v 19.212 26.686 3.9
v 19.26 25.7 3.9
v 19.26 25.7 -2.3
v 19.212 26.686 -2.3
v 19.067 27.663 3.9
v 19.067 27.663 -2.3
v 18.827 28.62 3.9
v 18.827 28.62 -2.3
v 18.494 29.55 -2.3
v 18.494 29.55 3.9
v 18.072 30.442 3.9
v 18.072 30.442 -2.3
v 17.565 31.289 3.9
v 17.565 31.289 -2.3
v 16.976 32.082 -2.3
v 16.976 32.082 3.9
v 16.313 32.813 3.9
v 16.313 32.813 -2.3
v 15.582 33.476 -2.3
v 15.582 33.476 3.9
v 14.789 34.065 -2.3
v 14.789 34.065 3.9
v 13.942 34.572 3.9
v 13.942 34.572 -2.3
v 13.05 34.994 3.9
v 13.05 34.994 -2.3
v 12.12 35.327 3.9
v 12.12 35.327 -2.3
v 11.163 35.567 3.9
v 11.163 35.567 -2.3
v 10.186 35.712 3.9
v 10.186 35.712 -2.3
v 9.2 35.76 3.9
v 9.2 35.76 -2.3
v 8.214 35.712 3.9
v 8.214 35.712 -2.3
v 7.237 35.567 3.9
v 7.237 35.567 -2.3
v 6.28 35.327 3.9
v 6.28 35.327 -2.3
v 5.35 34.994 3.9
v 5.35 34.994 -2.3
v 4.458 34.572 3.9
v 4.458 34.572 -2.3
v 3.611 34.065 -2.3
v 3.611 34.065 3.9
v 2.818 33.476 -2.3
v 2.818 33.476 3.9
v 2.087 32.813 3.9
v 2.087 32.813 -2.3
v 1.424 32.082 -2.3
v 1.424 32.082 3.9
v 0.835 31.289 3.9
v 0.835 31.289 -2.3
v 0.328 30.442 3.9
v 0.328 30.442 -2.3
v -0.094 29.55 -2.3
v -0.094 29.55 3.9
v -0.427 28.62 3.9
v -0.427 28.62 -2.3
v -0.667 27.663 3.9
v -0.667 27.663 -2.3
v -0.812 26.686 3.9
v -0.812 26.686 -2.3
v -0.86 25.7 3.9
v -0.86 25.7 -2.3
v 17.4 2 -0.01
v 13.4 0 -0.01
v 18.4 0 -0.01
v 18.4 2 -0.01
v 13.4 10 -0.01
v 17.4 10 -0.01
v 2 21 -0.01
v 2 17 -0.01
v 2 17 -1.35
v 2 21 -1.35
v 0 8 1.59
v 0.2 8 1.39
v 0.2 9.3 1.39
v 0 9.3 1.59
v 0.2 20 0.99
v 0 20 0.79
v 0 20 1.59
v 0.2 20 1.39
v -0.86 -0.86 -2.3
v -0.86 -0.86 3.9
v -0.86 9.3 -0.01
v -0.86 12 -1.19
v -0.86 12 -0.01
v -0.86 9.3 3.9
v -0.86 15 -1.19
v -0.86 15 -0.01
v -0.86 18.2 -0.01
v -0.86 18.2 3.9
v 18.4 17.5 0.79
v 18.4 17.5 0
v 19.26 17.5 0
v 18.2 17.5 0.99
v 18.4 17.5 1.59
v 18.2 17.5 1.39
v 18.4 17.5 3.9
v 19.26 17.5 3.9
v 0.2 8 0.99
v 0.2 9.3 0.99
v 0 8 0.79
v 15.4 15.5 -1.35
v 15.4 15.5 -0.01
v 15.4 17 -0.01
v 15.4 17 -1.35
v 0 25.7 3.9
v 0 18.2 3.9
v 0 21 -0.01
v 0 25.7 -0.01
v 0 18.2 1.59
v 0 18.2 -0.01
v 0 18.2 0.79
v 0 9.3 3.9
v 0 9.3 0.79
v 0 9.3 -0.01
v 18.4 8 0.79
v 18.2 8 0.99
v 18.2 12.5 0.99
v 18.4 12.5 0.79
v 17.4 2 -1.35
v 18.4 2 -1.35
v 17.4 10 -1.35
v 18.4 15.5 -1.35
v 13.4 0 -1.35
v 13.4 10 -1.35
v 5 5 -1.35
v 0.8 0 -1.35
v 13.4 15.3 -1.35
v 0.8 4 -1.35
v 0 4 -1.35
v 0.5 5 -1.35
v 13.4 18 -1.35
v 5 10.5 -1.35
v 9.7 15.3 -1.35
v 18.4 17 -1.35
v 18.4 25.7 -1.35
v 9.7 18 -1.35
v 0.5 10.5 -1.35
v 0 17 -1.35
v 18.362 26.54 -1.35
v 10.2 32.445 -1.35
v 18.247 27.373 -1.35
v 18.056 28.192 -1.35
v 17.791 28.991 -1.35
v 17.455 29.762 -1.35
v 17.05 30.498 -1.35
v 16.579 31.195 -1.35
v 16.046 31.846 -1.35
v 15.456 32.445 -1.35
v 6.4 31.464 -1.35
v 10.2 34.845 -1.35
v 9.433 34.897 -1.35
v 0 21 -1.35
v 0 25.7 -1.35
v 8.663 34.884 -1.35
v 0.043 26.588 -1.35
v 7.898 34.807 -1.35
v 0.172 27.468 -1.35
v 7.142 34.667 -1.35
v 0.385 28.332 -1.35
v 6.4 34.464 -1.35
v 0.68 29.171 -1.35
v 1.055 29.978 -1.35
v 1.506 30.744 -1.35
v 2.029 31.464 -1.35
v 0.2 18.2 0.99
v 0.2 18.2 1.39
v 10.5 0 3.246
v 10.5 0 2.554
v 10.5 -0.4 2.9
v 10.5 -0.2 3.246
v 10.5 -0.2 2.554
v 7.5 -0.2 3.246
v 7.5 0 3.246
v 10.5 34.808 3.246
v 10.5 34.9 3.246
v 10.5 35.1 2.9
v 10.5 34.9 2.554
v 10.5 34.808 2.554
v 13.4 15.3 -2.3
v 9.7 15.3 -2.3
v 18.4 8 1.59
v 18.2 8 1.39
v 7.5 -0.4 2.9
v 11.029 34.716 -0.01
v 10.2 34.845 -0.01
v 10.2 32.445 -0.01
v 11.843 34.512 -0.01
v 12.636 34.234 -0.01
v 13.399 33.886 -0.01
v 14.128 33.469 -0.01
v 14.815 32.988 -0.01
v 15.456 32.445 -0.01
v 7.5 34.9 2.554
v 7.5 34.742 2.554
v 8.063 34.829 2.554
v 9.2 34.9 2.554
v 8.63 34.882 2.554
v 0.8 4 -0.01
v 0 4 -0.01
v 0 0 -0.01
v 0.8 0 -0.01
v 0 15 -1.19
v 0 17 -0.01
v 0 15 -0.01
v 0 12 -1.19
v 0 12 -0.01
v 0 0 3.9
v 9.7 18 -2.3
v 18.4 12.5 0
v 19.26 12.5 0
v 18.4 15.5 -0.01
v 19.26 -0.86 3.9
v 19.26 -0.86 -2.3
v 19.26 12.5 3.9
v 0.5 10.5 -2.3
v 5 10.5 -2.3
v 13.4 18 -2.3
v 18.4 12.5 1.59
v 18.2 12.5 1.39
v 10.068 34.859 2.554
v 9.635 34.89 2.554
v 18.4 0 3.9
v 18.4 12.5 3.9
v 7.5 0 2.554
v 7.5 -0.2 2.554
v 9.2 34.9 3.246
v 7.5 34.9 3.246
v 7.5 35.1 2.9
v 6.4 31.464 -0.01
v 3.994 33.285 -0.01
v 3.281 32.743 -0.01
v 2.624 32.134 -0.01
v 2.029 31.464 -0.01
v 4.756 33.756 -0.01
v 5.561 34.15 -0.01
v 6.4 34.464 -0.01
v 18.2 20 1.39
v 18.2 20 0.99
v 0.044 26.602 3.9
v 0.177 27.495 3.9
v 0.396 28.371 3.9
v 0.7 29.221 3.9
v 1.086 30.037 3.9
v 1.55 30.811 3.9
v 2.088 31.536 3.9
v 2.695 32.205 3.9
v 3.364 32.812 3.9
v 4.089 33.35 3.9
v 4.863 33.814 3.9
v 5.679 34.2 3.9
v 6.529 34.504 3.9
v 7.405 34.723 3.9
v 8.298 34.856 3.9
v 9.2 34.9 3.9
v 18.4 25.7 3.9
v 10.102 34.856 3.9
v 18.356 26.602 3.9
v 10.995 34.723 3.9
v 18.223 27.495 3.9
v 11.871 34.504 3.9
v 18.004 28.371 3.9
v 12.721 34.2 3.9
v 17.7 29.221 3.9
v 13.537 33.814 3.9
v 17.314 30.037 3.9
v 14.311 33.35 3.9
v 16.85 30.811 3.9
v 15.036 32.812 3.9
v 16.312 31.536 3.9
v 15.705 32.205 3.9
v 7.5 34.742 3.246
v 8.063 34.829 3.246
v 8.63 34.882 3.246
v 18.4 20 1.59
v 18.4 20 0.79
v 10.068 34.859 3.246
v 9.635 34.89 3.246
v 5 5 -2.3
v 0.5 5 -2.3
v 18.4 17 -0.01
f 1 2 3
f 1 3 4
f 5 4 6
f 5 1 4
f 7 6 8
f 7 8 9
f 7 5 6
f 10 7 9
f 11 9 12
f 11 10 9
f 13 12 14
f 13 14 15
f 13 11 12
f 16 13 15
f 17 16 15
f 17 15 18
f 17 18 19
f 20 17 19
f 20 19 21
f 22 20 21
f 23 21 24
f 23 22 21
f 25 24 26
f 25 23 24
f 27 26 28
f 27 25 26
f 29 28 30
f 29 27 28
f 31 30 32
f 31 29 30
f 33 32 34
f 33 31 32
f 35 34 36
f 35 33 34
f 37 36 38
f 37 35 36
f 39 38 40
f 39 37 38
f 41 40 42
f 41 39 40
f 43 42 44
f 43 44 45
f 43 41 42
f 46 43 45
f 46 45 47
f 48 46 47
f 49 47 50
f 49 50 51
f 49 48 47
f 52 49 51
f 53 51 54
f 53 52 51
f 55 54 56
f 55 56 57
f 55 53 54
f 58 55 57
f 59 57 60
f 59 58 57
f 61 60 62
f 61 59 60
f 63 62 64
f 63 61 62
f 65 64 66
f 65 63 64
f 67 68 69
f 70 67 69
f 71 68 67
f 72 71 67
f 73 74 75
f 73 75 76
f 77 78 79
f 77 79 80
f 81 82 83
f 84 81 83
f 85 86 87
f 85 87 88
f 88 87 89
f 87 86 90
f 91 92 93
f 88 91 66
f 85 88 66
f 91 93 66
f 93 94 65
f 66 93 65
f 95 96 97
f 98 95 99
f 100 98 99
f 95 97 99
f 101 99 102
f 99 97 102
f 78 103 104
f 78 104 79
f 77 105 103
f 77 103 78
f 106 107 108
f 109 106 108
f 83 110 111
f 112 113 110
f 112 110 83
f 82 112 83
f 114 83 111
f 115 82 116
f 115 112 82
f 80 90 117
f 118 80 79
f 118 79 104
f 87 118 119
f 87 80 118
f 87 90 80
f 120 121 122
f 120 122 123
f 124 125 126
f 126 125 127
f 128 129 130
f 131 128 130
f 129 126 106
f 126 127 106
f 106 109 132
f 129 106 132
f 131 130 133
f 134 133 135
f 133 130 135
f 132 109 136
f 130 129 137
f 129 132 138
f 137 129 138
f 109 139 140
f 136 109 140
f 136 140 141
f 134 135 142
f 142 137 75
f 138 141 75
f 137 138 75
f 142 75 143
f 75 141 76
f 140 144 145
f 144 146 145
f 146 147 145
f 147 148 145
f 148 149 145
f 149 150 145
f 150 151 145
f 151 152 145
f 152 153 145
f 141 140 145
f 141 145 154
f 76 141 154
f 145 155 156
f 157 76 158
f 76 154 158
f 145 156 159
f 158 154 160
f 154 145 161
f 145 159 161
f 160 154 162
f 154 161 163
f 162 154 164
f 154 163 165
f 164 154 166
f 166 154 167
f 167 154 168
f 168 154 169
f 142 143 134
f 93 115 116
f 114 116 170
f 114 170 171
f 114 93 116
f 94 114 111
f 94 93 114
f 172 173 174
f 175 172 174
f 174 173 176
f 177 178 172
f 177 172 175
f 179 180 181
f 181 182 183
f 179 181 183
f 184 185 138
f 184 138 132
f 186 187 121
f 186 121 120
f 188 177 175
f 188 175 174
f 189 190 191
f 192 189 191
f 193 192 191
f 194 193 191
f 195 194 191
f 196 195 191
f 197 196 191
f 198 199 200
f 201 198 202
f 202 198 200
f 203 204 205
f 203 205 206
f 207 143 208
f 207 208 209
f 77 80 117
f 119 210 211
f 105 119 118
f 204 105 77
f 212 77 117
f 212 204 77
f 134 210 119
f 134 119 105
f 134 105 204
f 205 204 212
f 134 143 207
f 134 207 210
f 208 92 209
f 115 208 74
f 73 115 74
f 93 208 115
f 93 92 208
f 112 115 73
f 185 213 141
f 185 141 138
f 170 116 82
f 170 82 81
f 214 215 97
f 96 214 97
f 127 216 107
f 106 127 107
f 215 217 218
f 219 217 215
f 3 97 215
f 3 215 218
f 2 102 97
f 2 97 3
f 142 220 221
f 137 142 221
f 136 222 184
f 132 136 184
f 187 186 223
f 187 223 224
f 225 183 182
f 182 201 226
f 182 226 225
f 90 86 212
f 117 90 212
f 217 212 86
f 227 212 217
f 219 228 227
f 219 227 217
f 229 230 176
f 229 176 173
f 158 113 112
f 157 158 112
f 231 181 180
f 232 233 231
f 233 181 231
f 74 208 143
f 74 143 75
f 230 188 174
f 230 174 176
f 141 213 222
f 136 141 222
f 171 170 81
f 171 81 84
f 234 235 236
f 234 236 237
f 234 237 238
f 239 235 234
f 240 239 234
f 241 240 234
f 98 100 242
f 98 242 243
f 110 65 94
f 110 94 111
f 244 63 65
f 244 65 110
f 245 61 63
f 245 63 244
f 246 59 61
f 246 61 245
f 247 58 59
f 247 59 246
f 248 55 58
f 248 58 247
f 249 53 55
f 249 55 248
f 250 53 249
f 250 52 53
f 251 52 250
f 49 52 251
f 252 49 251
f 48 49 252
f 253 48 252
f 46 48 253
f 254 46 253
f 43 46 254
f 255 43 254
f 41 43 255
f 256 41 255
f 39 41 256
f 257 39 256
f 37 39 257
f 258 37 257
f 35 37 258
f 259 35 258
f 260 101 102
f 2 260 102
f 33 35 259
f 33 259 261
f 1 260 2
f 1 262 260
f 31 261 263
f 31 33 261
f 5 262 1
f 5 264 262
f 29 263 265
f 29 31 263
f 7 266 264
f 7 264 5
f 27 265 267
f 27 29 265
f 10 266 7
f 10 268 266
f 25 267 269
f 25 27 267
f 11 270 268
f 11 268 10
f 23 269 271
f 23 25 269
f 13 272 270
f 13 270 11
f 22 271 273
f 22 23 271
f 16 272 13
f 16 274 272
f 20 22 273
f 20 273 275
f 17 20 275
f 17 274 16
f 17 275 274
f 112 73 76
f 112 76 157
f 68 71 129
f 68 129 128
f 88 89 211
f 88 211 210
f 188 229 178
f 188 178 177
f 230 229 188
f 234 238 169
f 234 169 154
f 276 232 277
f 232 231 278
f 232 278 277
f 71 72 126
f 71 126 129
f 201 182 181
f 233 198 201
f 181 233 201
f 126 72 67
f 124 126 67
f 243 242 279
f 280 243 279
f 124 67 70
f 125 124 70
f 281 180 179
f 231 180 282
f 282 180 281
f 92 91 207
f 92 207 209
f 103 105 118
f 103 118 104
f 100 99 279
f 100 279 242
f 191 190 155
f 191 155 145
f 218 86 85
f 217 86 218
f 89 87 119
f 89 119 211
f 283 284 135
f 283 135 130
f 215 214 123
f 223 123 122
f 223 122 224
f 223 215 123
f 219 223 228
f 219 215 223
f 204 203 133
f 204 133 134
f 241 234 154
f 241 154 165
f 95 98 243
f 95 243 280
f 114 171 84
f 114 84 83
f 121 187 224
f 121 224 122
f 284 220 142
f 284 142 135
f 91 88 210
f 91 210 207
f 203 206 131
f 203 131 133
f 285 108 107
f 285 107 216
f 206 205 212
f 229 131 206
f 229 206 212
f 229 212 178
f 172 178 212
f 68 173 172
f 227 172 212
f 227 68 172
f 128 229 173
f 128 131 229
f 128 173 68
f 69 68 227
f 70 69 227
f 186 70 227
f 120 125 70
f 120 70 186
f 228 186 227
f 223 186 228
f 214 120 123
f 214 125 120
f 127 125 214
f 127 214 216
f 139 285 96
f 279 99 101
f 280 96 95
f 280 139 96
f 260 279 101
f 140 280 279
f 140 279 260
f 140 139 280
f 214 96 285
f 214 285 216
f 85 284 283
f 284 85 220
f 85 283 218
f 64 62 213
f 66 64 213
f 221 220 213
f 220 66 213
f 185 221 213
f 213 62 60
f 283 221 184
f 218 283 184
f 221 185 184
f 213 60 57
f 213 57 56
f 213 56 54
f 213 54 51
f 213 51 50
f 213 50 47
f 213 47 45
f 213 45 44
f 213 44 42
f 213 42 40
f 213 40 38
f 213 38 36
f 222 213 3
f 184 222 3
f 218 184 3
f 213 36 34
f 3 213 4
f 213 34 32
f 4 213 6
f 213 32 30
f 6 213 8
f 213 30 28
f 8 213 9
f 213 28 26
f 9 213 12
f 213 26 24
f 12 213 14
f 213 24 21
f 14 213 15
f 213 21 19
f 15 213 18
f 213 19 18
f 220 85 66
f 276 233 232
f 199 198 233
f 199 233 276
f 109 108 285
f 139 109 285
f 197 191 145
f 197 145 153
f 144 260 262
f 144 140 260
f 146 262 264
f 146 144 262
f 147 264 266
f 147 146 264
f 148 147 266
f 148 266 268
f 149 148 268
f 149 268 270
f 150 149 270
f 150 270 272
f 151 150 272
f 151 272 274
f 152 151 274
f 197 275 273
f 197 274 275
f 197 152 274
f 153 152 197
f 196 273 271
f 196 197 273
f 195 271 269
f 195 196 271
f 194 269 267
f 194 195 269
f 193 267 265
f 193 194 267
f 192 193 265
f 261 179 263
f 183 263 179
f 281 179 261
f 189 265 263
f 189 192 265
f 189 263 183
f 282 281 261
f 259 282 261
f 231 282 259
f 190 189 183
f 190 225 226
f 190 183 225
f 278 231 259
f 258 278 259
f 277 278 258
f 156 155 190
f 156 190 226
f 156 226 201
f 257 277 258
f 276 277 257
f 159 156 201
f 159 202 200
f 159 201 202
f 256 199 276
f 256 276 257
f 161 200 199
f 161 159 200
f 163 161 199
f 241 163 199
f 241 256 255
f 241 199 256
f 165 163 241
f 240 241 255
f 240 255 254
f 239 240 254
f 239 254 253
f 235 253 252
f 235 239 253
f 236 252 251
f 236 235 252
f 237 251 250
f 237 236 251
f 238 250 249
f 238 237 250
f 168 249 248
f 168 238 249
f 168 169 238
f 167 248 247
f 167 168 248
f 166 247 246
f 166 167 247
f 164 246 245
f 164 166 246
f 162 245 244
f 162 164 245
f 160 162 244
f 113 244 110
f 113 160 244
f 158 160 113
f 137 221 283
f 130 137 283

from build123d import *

# Parameters (mm, degrees)
PAD_DEPTH         = 3.9
PAD_DEPTH_BACK    = 2.3
POCKET_DEPTH      = 0.01
POCKET_DEPTH_BACK = 20
POCKET001_DEPTH   = 1.35
PAD001_DEPTH      = 12
POCKET002_DEPTH   = 5
SKETCH004_W       = 5
SKETCH004_H       = 4
POCKET003_DEPTH   = 5
SKETCH006_W       = 4.5
SKETCH006_H       = 5.5
SKETCH006_W_2     = 3.7
SKETCH006_H_2     = 2.7
POCKET004_DEPTH   = 5
PRISM_DEPTH       = 3
PRISM001_DEPTH    = 3


with BuildPart() as part:
    # Sketch → Pad (new body, two sides)
    with BuildSketch(Plane.XY) as pad_sk:
        with BuildLine():
            Line((-0.86, -0.86), (19.26, -0.86))
            Line((19.26, -0.86), (19.26, 25.7000002895))
            ThreePointArc((19.26, 25.7000002895), (9.1999999842, 35.7600003468), (-0.86, 25.7000002578))
            Line((-0.86, -0.86), (-0.86, 25.7000002578))
        make_face()
    extrude(amount=PAD_DEPTH)
    extrude(pad_sk.sketch, amount=-PAD_DEPTH_BACK)

    # Sketch001 → Pocket (cut, two sides)
    with BuildSketch(Plane.XY) as pocket_sk:
        with BuildLine():
            Line((1e-10, 25.6999686791), (1e-10, 0))
            Line((1e-10, 0), (18.4, 0))
            Line((18.4, 0), (18.4, 25.7))
            ThreePointArc((18.4, 25.7), (9.1999843395, 34.9), (1e-10, 25.6999686791))
        make_face()
    extrude(amount=-POCKET_DEPTH, mode=Mode.SUBTRACT)
    extrude(pocket_sk.sketch, amount=POCKET_DEPTH_BACK, mode=Mode.SUBTRACT)

    # Sketch003 → Pocket001 (cut)
    with BuildSketch(Plane.XY):
        with BuildLine():
            Line((17.4, 10), (13.4, 10))
            Line((13.4, 10), (13.4, 0))
            Line((13.4, 0), (0.8, 0))
            Line((0.8, 0), (0.8, 4))
            Line((0.8, 4), (0, 4))
            Line((0, 4), (0, 17))
            Line((0, 17), (2, 17))
            Line((2, 17), (2, 21))
            Line((2, 21), (0, 21))
            Line((1e-10, 25.6999686791), (0, 21))
            ThreePointArc((2.0291307695, 31.4635609201), (0.5220919157, 28.7551450506), (1e-10, 25.6999686791))
            Line((2.0291307695, 31.4635609201), (6.4, 31.4635609201))
            Line((6.4, 31.4635609201), (6.4, 34.4635609201))
            ThreePointArc((10.2, 34.8454906921), (8.2799632683, 34.8538807296), (6.4, 34.4635609201))
            Line((10.2, 34.8454906921), (10.2, 32.4454906921))
            Line((10.2, 32.4454906921), (15.4560654826, 32.4454906921))
            ThreePointArc((18.4, 25.7), (17.6319571405, 29.3799590732), (15.4560654826, 32.4454906921))
            Line((18.4, 25.7), (18.4, 17))
            Line((15.4, 17), (18.4, 17))
            Line((15.4, 15.5), (15.4, 17))
            Line((18.4, 15.5), (15.4, 15.5))
            Line((18.4, 15.5), (18.4, 2))
            Line((17.4, 2), (18.4, 2))
            Line((17.4, 10), (17.4, 2))
        make_face()
    extrude(amount=-POCKET001_DEPTH, mode=Mode.SUBTRACT)

    # Sketch007 (on Face8 of Pocket001) → Pad001 (join)
    with BuildSketch(Plane(origin=(0, 8, 0), x_dir=(-1, 0, 0), z_dir=(0, 1, 0))):
        Polygon((-1e-10, 0.79), (-0.2000000001, 0.99), (-0.2000000001, 1.39), (-1e-10, 1.59), align=None)
        Polygon((-18.4, 1.59), (-18.2, 1.39), (-18.2, 0.99), (-18.4, 0.79), align=None)
    extrude(amount=PAD001_DEPTH)

    # Sketch002 (on Face2 of Pocket) → Pocket002 (cut)
    with BuildSketch(Plane(origin=(-0.86, 0, 0), x_dir=(0, -1, 0), z_dir=(-1, 0, 0))):
        Polygon((-18.2, -0.01), (-18.2, 3.99), (-9.3, 3.99), (-9.3, -0.01), (-12, -0.01), (-12, -1.19), (-15, -1.19), (-15, -0.01), align=None)
    extrude(amount=-POCKET002_DEPTH, mode=Mode.SUBTRACT)

    # Sketch004 (on Face3 of Pocket002) → Pocket003 (cut)
    with BuildSketch(Plane.YZ.offset(19.26)):
        with Locations((15, 2)):
            Rectangle(SKETCH004_W, SKETCH004_H)
    extrude(amount=-POCKET003_DEPTH, mode=Mode.SUBTRACT)

    # Sketch006 (on Face4 of Pocket003) → Pocket004 (cut)
    with BuildSketch(Plane(origin=(0, 0, -2.3), x_dir=(1, 0, 0), z_dir=(0, 0, -1))):
        with Locations((2.75, -7.75)):
            Rectangle(SKETCH006_W, SKETCH006_H)
        with Locations((11.55, -16.65)):
            Rectangle(SKETCH006_W_2, SKETCH006_H_2)
    extrude(amount=-POCKET004_DEPTH, mode=Mode.SUBTRACT)

    # Prism → Prism (cut)
    with BuildSketch(Plane(origin=(7.49996936, 34.6999942124, 2.9), x_dir=(3.4044e-06, -1, 0), z_dir=(1, 3.4044e-06, 0))):
        Polygon((0.4, 0), (0.2, 0.3464101615), (-0.2, 0.3464101615), (-0.4, 0), (-0.2, -0.3464101615), (0.2, -0.3464101615), align=None)
    extrude(amount=PRISM_DEPTH, mode=Mode.SUBTRACT)

    # Prism001 → Prism001 (cut)
    with BuildSketch(Plane(origin=(7.5000000001, 0, 2.9), x_dir=(0, -1, 0), z_dir=(1, 0, 0))):
        Polygon((0.4, 0), (0.2, 0.3464101615), (-0.2, 0.3464101615), (-0.4, 0), (-0.2, -0.3464101615), (0.2, -0.3464101615), align=None)
    extrude(amount=PRISM001_DEPTH, mode=Mode.SUBTRACT)


solid = part.part
